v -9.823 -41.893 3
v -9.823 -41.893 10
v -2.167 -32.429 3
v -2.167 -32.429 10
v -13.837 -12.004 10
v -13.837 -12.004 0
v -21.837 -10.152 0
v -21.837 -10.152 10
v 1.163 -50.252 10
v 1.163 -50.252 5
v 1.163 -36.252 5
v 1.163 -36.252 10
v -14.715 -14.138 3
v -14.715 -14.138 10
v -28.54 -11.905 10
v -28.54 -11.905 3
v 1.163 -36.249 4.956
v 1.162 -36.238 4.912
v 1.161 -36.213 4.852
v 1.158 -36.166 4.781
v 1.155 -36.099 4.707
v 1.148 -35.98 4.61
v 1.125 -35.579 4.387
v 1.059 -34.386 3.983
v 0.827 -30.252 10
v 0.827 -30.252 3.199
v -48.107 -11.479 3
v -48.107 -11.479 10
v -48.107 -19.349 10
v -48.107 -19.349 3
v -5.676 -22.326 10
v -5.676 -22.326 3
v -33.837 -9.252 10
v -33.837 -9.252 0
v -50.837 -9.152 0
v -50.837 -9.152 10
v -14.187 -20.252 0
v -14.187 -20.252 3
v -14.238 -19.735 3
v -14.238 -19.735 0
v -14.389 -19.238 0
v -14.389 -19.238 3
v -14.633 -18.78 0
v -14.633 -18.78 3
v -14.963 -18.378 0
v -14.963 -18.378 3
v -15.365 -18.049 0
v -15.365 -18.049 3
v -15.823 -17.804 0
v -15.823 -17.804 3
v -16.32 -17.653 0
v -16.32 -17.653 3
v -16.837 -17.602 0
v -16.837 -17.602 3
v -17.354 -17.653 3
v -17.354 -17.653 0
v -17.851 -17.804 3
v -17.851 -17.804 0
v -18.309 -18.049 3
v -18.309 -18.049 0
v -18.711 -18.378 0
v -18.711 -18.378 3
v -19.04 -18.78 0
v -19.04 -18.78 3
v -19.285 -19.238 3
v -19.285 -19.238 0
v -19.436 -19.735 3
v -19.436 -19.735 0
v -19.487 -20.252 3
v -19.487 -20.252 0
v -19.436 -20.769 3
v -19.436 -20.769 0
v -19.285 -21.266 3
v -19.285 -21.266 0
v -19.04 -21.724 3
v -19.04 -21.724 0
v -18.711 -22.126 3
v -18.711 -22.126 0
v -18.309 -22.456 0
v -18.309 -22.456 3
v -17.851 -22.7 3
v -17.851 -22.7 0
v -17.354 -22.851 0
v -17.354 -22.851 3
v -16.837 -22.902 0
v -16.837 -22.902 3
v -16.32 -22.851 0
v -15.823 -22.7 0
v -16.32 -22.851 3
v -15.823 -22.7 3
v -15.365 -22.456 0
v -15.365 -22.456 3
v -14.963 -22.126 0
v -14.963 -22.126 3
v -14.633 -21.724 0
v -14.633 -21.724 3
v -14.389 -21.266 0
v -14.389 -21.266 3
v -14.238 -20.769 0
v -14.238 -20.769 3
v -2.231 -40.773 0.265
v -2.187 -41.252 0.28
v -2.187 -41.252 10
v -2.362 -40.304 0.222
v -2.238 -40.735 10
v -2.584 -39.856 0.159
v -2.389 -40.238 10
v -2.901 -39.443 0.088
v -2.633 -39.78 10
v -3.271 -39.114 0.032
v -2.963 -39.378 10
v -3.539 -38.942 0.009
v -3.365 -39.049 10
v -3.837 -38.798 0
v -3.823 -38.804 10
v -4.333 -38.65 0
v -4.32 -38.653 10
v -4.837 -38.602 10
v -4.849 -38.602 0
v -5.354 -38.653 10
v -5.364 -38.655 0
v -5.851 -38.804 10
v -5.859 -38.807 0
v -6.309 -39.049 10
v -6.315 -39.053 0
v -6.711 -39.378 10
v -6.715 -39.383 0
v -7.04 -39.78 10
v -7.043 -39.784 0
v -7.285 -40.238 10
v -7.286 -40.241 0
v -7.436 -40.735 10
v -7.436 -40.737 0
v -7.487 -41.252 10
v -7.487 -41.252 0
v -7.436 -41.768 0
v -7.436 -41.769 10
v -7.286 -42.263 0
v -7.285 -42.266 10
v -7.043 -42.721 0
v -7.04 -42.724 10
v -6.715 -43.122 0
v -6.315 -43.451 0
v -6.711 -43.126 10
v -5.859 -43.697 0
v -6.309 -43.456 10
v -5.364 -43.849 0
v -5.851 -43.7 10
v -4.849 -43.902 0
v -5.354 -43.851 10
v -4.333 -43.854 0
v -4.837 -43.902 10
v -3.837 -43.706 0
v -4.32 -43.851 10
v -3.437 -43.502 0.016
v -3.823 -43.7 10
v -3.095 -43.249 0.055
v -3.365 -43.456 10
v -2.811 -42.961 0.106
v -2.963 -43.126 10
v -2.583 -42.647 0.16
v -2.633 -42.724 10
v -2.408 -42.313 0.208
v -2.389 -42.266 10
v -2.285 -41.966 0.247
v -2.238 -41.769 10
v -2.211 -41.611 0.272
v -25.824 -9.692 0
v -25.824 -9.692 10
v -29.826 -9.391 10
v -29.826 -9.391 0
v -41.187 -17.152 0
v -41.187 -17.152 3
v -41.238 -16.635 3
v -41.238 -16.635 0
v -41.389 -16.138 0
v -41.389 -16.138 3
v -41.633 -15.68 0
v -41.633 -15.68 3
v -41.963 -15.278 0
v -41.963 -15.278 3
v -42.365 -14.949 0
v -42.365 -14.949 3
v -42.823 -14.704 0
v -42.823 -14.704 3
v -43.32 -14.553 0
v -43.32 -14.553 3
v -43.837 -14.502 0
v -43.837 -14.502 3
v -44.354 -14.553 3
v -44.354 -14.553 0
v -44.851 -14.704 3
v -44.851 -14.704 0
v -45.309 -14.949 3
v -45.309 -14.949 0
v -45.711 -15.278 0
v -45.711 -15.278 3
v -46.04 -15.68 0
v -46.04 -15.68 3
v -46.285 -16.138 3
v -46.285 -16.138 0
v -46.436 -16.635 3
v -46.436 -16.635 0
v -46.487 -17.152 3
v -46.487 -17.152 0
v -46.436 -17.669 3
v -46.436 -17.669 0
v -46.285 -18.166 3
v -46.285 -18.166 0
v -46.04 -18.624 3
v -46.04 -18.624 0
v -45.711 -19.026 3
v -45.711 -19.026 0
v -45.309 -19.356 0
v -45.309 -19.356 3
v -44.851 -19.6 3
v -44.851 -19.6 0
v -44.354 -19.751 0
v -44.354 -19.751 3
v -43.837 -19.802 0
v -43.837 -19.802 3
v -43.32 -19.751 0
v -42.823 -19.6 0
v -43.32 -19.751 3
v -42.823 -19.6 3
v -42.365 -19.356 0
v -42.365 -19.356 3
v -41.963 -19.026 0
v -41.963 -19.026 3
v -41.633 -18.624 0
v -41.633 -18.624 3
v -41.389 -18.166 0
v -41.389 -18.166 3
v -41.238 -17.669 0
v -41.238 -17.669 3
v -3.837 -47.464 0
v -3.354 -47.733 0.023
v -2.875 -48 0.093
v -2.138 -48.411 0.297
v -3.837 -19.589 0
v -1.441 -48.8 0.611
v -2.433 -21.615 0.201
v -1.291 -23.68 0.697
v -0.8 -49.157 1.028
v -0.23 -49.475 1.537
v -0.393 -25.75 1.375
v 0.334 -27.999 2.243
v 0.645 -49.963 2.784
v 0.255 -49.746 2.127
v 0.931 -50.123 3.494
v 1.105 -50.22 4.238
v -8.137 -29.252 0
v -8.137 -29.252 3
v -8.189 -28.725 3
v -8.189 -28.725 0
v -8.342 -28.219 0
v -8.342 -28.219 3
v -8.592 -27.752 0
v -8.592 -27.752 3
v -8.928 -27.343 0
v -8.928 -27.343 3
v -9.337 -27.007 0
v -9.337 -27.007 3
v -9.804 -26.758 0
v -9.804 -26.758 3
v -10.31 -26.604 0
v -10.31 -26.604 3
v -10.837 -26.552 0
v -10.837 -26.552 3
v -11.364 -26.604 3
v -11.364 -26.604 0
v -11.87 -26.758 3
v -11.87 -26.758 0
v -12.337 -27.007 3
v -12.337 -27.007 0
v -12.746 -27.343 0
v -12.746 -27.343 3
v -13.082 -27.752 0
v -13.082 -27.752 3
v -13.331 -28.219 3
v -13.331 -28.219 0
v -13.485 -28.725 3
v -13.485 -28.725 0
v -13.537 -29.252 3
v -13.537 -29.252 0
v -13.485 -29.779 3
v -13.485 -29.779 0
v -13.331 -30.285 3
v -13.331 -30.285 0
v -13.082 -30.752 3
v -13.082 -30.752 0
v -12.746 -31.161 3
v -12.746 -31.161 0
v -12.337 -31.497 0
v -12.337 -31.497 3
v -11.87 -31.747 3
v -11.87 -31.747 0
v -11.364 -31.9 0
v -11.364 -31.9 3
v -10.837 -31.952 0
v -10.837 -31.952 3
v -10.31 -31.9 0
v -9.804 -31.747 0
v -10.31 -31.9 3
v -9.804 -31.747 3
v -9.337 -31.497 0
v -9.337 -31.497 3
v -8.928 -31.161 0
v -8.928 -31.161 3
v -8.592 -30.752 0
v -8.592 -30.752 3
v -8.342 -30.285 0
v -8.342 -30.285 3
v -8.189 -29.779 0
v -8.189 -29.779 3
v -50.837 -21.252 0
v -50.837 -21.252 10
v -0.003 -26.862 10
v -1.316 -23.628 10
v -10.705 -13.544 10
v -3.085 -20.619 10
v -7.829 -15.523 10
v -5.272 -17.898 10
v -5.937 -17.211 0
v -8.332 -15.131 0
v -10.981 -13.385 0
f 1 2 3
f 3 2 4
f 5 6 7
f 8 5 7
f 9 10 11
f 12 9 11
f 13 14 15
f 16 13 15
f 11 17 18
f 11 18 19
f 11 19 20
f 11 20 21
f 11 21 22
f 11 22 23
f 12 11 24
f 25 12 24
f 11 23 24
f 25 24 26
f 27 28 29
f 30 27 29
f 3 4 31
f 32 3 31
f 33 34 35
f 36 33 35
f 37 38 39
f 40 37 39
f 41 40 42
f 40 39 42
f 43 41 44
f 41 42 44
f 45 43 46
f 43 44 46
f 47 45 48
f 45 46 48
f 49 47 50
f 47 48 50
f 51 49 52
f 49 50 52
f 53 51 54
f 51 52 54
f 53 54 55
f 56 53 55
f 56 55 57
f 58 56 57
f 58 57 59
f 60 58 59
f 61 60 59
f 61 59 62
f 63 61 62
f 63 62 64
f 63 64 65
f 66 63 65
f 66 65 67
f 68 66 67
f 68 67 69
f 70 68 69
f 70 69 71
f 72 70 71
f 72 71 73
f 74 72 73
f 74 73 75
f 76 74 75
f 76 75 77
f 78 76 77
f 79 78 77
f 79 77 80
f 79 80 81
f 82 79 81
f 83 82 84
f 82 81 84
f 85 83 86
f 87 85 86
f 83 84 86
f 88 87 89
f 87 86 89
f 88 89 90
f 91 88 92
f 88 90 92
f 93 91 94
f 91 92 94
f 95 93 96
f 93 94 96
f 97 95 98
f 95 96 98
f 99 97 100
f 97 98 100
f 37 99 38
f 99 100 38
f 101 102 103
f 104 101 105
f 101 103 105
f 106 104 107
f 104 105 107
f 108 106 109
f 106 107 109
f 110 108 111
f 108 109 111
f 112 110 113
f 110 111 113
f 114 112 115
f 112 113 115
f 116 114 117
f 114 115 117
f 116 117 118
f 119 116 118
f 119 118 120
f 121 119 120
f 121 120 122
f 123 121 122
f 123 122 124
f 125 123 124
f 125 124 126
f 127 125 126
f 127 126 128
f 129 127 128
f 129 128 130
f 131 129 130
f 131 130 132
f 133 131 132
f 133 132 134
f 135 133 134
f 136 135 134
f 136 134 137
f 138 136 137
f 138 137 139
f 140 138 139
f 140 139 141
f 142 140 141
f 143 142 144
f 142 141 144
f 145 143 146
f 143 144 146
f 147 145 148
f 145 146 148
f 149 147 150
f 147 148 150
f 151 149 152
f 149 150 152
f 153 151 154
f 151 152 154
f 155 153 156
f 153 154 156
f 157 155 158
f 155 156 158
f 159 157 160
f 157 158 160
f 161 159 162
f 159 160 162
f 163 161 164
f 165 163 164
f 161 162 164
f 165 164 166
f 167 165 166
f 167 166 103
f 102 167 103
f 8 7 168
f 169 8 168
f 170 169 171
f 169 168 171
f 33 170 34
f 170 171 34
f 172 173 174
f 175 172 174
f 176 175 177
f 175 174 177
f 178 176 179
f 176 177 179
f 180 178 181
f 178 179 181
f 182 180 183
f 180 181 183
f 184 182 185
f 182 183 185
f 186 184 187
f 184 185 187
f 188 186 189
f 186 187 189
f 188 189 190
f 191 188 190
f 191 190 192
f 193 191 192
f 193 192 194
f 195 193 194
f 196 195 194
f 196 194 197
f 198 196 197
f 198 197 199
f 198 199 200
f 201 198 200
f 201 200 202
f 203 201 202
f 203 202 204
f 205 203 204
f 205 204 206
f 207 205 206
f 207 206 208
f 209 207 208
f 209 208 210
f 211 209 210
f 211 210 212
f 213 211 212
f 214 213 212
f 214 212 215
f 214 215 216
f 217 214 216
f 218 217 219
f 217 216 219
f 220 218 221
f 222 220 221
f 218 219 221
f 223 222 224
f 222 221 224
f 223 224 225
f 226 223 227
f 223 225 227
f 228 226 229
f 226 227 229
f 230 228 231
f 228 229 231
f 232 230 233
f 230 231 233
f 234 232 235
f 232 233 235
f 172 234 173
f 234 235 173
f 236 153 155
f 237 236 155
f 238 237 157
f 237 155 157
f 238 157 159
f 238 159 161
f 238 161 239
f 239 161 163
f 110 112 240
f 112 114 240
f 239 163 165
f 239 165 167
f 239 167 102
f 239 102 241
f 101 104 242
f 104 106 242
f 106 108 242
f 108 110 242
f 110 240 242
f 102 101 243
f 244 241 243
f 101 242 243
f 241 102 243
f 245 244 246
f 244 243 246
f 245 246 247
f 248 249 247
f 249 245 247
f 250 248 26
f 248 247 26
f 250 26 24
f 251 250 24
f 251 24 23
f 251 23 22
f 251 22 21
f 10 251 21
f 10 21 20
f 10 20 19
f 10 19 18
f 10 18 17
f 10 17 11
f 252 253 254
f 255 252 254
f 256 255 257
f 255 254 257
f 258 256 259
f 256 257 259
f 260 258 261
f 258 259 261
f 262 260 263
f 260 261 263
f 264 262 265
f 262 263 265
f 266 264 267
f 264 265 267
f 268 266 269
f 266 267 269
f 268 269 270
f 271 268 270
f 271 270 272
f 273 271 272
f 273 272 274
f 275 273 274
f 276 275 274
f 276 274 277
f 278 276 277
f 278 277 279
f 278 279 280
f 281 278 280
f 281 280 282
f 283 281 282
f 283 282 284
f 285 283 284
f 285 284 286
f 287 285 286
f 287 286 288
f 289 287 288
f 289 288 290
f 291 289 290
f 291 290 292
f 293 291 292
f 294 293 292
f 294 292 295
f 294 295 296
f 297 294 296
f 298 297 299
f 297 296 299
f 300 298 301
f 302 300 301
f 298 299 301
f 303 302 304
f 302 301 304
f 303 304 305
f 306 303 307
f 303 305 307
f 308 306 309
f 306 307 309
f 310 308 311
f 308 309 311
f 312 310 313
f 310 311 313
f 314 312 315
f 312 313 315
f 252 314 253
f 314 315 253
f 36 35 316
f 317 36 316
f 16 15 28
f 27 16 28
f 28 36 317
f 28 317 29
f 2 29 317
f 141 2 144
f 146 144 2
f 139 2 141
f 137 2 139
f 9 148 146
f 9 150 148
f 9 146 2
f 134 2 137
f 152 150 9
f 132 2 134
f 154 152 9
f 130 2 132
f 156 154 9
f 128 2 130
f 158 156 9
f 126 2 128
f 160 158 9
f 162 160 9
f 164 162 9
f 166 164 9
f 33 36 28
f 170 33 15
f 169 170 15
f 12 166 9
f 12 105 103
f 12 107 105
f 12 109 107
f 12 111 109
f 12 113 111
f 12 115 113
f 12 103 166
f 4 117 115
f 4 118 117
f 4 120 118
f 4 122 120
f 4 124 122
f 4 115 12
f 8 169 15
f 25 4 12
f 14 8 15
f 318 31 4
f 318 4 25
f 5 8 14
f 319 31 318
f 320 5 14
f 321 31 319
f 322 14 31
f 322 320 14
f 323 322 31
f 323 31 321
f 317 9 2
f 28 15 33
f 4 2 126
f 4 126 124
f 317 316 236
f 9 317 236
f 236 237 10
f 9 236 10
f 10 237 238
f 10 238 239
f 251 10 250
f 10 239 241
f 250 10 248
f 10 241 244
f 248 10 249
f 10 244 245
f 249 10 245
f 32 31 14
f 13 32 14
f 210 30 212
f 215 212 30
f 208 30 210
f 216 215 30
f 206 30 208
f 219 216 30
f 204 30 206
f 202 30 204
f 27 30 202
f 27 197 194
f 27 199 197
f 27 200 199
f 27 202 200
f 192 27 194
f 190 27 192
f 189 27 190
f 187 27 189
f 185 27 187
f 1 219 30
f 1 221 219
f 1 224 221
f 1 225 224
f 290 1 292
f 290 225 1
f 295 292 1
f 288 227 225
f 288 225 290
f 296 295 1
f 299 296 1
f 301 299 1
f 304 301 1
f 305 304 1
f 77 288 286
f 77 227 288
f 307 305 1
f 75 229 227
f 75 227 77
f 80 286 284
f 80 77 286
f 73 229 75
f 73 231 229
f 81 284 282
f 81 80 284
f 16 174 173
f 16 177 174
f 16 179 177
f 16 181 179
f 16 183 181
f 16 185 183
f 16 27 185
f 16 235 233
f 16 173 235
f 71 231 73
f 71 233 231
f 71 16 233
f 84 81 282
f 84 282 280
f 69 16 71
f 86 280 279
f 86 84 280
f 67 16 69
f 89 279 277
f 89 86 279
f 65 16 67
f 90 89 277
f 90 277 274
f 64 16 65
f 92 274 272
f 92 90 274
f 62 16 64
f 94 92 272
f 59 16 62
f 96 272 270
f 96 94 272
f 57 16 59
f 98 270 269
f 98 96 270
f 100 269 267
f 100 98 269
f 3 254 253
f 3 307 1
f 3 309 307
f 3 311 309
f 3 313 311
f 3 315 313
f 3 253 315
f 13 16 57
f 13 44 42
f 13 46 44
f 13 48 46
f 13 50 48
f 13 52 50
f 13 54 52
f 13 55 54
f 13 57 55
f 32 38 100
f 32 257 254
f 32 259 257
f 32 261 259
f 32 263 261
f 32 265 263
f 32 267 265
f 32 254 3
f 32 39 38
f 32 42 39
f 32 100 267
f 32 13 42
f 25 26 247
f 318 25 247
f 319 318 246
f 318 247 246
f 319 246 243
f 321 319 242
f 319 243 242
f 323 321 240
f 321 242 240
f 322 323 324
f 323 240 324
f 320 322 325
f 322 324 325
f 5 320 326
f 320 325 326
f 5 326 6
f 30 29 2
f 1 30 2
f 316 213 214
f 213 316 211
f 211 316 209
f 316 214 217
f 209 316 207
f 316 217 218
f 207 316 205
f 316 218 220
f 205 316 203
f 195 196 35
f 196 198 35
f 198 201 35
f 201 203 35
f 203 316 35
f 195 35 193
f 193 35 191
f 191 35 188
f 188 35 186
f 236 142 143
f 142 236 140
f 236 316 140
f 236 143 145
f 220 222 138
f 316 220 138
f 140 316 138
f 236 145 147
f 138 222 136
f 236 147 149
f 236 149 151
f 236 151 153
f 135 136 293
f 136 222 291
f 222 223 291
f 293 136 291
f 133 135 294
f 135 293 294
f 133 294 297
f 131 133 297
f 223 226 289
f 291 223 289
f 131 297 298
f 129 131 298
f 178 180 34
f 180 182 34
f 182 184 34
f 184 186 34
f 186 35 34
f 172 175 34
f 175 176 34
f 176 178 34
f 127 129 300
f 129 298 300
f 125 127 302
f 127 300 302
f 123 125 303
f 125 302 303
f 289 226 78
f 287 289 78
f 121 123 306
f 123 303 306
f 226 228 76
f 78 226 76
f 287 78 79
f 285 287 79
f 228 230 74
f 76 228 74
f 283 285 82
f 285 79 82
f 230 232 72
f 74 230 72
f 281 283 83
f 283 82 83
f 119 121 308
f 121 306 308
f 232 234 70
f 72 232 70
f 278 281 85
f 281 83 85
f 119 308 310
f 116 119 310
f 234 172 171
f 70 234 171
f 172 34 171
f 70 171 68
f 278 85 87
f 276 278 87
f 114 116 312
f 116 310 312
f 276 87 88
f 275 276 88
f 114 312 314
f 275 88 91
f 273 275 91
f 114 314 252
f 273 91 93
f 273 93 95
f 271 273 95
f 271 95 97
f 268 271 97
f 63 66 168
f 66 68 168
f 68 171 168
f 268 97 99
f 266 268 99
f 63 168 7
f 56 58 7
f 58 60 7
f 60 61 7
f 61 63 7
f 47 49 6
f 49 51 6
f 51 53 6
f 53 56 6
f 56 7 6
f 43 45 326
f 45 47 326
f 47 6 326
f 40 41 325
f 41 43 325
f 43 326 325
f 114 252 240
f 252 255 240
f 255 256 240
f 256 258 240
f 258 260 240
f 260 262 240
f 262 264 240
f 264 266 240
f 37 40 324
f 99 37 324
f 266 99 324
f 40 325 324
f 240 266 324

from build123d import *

# Parameters (mm, degrees)
F1_DEPTH    = 10
F2_R        = 2.65
F2_R_2      = 2.7
F3_DEPTH    = 10.001
F4_T1_DEPTH = 74
F6_DEPTH    = 7


# Not quite as in the source:
# - a fillet or chamfer that OpenCascade refuses, or shapes differently, is made with other operations: its cross-section is extruded or revolved along the edge and cut away or added


with BuildPart() as f1:
    # F0 (on Top) → F1 (new body)
    with BuildSketch(Plane.XY):
        with BuildLine():
            Line((-33.8368600405, -9.2521366523), (-50.8368600405, -9.1521366523))
            Line((-50.8368600405, -9.1521366523), (-50.8368600405, -21.2521366523))
            Line((-50.8368600405, -21.2521366523), (1.1631399595, -50.2521366523))
            Line((1.1631399595, -50.2521366523), (1.1631399595, -36.2521366523))
            Line((1.1631399595, -36.2521366523), (0.8274590919, -30.2521366523))
            ThreePointArc((0.8274590919, -30.2521366523), (-4.1287803642, -19.2185823544), (-13.8368600405, -12.003541191))
            Line((-13.8368600405, -12.003541191), (-21.8368600405, -10.1521366523))
            ThreePointArc((-21.8368600405, -10.1521366523), (-27.8233098501, -9.521467447), (-33.8368600405, -9.2521366523))
        make_face()
    extrude(amount=F1_DEPTH)

    # F2 (on face) → F3 (cut, through all)
    with BuildSketch(Plane.XY.offset(10)):
        with Locations((-43.8368600405, -17.1521366523)):
            Circle(F2_R)
        with Locations((-16.8368600405, -20.2521366523)):
            Circle(F2_R)
        with Locations((-4.8368600405, -41.2521366523)):
            Circle(F2_R)
        with Locations((-10.8368600405, -29.2521366523)):
            Circle(F2_R_2)
    extrude(amount=-F3_DEPTH, mode=Mode.SUBTRACT)

    # F4: fillet of radius 5 on 1 edges, made by hand

    # F4_s2 → F4_t1 (cut)
    with BuildSketch(Plane.XZ.offset(6.2521366523)):
        with BuildLine():
            ThreePointArc((-3.8368600405, 0), (-0.3013261345, 1.4644660941), (1.1631399595, 5))
            Line((1.1631399595, 5), (1.2631399595, 5))
            Line((1.2631399595, 5), (1.2631399595, -0.1))
            Line((1.2631399595, -0.1), (-3.8368600405, -0.1))
            Line((-3.8368600405, -0.1), (-3.8368600405, 0))
        make_face()
    extrude(amount=F4_T1_DEPTH, mode=Mode.SUBTRACT)

    # F5 (on face) → F6 (cut)
    with BuildSketch(Plane.XY.offset(10)):
        Polygon((-28.5395178944, -11.904838495), (-48.1065809727, -11.4794680849), (-48.1065809727, -19.3488299847), (-9.8231984302, -41.8934859335), (-2.166522434, -32.4289835989), (-5.6758336723, -22.3264265805), (-14.7149646655, -14.1380364075), align=None)
    extrude(amount=-F6_DEPTH, mode=Mode.SUBTRACT)


solid = f1.part
